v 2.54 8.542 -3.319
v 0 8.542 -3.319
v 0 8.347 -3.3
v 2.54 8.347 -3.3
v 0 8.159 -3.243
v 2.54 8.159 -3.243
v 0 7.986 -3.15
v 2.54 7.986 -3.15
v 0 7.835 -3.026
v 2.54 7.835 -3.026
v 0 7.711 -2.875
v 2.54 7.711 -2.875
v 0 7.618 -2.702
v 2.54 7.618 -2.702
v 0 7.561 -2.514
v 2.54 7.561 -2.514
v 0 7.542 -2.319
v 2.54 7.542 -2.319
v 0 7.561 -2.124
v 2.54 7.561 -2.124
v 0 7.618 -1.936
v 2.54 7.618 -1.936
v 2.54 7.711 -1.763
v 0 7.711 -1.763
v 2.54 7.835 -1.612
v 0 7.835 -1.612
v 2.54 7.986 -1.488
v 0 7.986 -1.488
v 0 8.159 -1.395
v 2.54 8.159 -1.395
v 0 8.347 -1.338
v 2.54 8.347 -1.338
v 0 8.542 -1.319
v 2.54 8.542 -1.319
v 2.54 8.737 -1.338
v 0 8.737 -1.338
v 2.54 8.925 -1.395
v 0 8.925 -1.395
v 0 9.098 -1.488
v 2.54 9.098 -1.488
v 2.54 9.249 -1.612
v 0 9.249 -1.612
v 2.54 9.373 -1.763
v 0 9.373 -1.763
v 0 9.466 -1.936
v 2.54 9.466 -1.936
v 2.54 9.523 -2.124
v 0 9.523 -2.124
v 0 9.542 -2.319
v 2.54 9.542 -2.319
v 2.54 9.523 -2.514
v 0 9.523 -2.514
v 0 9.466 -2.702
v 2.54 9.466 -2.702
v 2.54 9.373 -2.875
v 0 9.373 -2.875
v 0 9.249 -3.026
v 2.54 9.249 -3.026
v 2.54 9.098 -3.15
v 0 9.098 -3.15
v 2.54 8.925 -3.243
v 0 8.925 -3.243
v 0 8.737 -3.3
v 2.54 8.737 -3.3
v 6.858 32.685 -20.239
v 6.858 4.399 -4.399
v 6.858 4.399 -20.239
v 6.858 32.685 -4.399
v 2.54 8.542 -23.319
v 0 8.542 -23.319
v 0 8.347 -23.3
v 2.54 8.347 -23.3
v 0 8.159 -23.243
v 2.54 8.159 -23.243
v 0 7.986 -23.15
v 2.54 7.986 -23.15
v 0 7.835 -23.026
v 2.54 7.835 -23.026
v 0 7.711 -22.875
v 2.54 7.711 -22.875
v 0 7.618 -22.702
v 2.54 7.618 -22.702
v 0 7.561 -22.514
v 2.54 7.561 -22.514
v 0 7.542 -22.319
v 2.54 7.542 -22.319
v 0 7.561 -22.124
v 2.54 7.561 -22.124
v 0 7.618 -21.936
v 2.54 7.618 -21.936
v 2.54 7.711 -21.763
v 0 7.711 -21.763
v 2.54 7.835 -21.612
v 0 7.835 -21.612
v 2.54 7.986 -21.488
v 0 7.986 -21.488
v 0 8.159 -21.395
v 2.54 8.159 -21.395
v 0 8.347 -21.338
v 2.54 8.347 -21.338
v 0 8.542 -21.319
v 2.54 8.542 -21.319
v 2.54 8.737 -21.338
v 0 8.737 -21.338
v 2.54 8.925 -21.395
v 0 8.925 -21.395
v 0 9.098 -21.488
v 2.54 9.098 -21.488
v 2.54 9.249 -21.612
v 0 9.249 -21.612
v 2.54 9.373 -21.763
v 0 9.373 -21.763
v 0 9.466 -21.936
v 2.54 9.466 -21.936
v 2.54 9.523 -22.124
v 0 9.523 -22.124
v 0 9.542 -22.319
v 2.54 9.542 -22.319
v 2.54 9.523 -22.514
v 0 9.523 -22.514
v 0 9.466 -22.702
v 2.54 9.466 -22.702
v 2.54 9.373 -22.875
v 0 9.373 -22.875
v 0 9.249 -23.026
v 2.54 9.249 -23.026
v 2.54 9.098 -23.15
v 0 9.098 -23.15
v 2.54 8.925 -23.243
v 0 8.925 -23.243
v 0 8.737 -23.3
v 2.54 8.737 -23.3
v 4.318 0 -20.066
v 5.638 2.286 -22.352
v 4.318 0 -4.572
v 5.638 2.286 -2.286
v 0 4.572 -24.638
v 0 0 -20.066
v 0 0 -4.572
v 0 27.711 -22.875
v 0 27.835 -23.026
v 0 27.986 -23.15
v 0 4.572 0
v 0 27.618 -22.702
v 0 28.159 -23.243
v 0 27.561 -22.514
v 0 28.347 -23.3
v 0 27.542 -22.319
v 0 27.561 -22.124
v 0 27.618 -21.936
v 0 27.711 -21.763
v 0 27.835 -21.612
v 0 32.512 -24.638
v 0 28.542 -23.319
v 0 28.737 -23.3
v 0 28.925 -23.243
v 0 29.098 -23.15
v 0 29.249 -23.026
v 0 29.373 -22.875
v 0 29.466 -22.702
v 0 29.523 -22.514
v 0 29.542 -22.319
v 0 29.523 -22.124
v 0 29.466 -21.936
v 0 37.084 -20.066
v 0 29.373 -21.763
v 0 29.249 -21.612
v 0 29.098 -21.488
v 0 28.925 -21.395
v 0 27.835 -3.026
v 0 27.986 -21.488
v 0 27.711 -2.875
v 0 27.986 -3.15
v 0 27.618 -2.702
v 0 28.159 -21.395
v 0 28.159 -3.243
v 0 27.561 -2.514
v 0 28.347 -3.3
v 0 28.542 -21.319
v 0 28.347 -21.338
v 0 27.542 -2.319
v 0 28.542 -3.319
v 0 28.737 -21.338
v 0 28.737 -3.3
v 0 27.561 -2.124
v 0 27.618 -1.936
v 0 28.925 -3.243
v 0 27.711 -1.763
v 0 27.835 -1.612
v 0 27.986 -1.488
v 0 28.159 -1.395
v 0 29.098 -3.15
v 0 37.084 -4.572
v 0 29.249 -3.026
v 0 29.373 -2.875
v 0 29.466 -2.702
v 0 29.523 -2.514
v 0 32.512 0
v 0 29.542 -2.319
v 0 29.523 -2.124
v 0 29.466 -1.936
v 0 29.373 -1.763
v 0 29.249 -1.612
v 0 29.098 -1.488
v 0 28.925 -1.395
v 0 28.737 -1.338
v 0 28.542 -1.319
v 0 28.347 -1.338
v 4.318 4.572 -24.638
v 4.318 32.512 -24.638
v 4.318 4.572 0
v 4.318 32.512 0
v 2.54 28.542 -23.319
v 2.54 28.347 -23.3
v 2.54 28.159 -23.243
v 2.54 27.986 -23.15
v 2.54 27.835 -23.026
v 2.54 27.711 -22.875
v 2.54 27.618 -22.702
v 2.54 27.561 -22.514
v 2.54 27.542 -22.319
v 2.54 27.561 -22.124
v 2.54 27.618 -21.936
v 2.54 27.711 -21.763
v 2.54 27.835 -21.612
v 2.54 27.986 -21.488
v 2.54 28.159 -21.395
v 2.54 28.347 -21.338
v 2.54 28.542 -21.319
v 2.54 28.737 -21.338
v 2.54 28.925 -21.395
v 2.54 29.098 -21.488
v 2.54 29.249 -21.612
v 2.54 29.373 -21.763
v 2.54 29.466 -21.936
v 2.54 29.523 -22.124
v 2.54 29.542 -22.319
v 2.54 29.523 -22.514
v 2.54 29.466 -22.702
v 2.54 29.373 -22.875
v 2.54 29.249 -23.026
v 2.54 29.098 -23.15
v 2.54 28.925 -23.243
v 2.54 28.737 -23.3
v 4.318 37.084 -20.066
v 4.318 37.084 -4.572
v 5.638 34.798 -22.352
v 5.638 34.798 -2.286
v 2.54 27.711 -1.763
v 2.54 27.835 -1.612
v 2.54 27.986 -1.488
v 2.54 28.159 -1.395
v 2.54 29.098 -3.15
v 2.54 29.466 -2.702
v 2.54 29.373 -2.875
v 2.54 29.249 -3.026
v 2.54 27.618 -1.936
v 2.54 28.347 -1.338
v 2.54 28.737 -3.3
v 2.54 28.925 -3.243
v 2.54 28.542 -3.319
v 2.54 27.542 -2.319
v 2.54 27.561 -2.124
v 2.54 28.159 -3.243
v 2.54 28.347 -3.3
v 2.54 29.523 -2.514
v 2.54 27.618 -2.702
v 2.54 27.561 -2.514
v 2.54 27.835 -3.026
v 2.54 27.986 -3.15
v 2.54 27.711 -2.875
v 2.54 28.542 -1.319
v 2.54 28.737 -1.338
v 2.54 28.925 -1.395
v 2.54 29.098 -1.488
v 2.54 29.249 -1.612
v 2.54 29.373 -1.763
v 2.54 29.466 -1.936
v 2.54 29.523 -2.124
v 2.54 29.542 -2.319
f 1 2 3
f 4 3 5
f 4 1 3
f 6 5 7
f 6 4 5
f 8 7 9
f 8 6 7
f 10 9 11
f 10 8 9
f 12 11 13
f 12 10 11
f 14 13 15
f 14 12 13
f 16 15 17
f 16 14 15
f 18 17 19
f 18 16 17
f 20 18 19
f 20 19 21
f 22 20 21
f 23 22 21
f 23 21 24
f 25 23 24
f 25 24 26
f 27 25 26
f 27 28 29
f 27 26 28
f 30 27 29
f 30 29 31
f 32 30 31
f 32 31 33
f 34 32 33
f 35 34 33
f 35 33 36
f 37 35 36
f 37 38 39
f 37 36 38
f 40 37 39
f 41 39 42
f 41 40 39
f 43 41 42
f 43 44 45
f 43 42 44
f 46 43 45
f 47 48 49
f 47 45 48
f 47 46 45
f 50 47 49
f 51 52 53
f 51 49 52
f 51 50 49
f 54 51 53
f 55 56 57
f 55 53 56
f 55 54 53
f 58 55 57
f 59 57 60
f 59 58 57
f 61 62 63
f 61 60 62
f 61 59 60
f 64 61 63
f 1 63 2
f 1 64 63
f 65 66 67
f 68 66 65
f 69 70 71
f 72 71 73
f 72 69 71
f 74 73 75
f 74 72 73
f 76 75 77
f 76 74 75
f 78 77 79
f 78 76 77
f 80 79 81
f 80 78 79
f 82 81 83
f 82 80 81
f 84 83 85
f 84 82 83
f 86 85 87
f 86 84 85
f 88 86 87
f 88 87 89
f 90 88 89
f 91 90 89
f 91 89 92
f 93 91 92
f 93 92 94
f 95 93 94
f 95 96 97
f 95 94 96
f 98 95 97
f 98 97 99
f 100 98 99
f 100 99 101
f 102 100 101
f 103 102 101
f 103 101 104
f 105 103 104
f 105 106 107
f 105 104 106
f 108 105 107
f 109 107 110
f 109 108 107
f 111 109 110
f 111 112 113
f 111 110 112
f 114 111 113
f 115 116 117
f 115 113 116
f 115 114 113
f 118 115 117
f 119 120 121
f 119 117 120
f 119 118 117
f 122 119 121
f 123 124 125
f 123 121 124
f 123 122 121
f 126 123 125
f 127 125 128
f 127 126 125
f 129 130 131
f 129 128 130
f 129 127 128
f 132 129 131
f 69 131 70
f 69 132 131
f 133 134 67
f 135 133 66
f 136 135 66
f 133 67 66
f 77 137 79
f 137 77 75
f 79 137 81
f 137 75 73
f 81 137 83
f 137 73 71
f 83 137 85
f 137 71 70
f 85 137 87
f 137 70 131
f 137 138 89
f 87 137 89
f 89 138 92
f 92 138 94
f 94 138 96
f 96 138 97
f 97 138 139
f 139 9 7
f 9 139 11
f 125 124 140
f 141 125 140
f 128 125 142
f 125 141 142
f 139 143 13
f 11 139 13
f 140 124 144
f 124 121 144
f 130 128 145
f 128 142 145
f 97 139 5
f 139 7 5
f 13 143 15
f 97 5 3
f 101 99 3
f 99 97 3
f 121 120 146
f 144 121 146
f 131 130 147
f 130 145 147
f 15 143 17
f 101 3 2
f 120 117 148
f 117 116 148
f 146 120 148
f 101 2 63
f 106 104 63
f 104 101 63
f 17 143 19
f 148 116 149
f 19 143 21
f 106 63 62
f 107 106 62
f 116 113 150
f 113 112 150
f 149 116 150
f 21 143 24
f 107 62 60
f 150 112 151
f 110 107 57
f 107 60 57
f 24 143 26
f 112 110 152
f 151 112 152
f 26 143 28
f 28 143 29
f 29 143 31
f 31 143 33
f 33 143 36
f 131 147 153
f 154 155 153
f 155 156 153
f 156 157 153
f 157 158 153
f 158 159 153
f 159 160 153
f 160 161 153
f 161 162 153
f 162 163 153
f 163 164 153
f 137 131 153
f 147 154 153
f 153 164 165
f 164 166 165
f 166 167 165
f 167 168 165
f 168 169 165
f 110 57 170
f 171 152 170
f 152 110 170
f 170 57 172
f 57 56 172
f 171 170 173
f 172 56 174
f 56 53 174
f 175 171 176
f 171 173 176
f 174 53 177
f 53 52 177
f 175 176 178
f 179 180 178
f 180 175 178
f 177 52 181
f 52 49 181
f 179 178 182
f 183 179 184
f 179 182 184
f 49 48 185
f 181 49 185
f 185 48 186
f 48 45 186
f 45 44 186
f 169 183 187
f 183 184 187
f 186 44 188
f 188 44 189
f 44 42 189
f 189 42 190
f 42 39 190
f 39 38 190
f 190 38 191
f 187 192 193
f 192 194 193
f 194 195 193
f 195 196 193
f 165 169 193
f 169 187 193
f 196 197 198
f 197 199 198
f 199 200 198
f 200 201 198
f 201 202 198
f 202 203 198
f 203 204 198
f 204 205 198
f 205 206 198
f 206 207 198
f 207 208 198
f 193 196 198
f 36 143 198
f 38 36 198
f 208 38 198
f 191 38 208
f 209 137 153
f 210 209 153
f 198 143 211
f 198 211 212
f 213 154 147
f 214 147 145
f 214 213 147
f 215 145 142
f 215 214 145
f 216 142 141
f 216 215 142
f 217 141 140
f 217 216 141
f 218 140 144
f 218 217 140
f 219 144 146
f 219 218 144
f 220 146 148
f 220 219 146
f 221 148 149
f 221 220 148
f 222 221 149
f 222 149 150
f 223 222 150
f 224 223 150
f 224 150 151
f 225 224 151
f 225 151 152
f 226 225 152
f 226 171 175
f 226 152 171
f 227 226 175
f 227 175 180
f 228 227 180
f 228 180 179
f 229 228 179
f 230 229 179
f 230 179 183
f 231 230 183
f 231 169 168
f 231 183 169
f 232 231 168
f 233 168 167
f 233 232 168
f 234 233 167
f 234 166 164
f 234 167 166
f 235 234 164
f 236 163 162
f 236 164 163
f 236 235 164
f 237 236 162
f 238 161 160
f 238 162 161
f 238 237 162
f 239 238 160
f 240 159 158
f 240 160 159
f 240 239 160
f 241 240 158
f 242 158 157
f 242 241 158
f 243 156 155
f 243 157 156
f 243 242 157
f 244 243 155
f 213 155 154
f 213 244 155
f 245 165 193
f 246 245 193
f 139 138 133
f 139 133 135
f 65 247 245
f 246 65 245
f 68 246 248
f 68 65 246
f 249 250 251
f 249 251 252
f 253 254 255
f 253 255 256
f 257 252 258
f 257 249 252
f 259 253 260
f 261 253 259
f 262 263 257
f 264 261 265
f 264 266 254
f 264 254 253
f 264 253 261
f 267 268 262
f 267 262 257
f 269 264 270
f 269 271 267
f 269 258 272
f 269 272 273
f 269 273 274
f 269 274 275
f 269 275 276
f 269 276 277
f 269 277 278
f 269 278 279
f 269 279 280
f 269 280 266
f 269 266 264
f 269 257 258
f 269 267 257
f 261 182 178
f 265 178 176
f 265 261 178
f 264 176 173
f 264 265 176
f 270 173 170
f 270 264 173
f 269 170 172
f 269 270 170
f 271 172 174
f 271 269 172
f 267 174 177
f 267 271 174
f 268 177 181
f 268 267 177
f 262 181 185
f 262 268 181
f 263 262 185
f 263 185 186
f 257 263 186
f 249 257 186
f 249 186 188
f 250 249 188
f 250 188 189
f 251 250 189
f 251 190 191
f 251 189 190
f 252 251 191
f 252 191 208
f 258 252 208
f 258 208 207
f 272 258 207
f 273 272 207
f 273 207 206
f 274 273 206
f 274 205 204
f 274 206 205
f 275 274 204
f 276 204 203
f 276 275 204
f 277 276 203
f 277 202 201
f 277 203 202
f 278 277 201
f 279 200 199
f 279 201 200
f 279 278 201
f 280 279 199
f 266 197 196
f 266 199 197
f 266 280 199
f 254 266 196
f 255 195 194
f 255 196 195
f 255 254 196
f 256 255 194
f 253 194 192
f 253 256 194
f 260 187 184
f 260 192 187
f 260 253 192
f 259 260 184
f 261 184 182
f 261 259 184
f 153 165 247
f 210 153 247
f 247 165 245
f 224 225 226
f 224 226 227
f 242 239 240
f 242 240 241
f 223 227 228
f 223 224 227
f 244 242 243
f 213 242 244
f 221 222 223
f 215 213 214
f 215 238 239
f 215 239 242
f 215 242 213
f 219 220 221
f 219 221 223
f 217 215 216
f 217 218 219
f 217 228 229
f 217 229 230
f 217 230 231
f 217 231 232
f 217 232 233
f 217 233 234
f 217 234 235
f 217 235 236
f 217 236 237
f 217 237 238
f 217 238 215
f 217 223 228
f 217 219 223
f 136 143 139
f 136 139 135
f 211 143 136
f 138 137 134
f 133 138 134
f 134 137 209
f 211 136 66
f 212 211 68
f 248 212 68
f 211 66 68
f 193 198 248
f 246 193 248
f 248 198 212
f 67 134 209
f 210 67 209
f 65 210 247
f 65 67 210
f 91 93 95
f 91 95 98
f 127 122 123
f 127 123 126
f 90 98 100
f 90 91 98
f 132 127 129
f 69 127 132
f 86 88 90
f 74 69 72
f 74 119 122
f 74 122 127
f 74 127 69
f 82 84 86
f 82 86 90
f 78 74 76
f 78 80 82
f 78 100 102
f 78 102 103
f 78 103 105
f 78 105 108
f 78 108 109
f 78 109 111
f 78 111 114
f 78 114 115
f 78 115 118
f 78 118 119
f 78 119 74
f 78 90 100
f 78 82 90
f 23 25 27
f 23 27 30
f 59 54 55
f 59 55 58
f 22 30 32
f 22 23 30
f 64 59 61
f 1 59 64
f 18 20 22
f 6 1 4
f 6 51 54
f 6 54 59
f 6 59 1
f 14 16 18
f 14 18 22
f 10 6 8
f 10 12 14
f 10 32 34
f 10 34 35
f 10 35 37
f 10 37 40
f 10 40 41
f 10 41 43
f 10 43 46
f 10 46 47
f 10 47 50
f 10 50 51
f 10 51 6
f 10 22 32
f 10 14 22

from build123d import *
from OCP.BRepFilletAPI import BRepFilletAPI_MakeChamfer

# Parameters (mm, degrees)
SKETCH1_W               = 37.084
SKETCH1_H               = 24.638
BOSS_EXTRUDE1_DEPTH     = 6.858
CHAMFER2_SIZE           = 4.572
CHAMFER3_SIZE           = 2.54
CHAMFER3_SIZE2          = 4.399409051
CHAMFER4_SIZE           = 2.54
CHAMFER4_SIZE2          = 4.399409051
CUT_EXTRUDE1_DEPTH      = 46.04759998
CUT_EXTRUDE1_DEPTH_BACK = 2.54
SKETCH3_R               = 1


with BuildPart() as part:
    # Sketch1 → Boss-Extrude1 (new body)
    with BuildSketch(Plane.YZ):
        with Locations((18.542, -12.319)):
            Rectangle(SKETCH1_W, SKETCH1_H)
    extrude(amount=BOSS_EXTRUDE1_DEPTH)

    # Chamfer2
    chamfer2_edges = [part.edges().sort_by_distance(p)[0] for p in [
        (3.429, 0, 0),
        (3.429, 37.084, 0),
        (3.429, 37.084, -24.638),
        (3.429, 0, -24.638),
    ]]
    chamfer(chamfer2_edges, length=CHAMFER2_SIZE)

    # Chamfer3: one chamfer whose edges measure the first distance from different faces: ONE call of the kernel's chamfer builder (chamfer() names one face for all edges)
    chamfer3_edges_1 = [part.edges().sort_by_distance(p)[0] for p in [
        (6.858, 18.542, 0),
    ]]
    chamfer3_side_1 = [part.faces().sort_by_distance(p)[0] for p in [
        (3.429, 18.542, 0),
    ]]
    chamfer3_edges_2 = [part.edges().sort_by_distance(p)[0] for p in [
        (6.858, 18.542, -24.638),
    ]]
    chamfer3_side_2 = [part.faces().sort_by_distance(p)[0] for p in [
        (3.429, 18.542, -24.638),
    ]]
    chamfer3 = BRepFilletAPI_MakeChamfer(part.part.solid().wrapped)
    for e in chamfer3_edges_1:
        chamfer3.Add(CHAMFER3_SIZE, CHAMFER3_SIZE2, e.wrapped, chamfer3_side_1[0].wrapped)  # the first distance lies on this face
    for e in chamfer3_edges_2:
        chamfer3.Add(CHAMFER3_SIZE, CHAMFER3_SIZE2, e.wrapped, chamfer3_side_2[0].wrapped)  # the first distance lies on this face
    add(Compound.cast(chamfer3.Shape()), mode=Mode.REPLACE)

    # Chamfer4: one chamfer whose edges measure the first distance from different faces: ONE call of the kernel's chamfer builder (chamfer() names one face for all edges)
    chamfer4_edges_1 = [part.edges().sort_by_distance(p)[0] for p in [
        (6.858, 0, -12.319),
    ]]
    chamfer4_side_1 = [part.faces().sort_by_distance(p)[0] for p in [
        (3.429, 0, -12.319),
    ]]
    chamfer4_edges_2 = [part.edges().sort_by_distance(p)[0] for p in [
        (6.858, 37.084, -12.319),
    ]]
    chamfer4_side_2 = [part.faces().sort_by_distance(p)[0] for p in [
        (3.429, 37.084, -12.319),
    ]]
    chamfer4 = BRepFilletAPI_MakeChamfer(part.part.solid().wrapped)
    for e in chamfer4_edges_1:
        chamfer4.Add(CHAMFER4_SIZE, CHAMFER4_SIZE2, e.wrapped, chamfer4_side_1[0].wrapped)  # the first distance lies on this face
    for e in chamfer4_edges_2:
        chamfer4.Add(CHAMFER4_SIZE, CHAMFER4_SIZE2, e.wrapped, chamfer4_side_2[0].wrapped)  # the first distance lies on this face
    add(Compound.cast(chamfer4.Shape()), mode=Mode.REPLACE)

    # Sketch3 → Cut-Extrude1 (cut, two sides: drawn at the far end of the back side and taken through both)
    with BuildSketch(Plane(origin=(0, 0, 0), x_dir=(0, -1, 0), z_dir=(-1, 0, 0)).offset(-CUT_EXTRUDE1_DEPTH_BACK)):
        with Locations(Location((-8.542, -2.319, 0), (0, 0, 270))):
            Circle(SKETCH3_R)
        with Locations(Location((-8.542, -22.319, 0), (0, 0, 270))):
            Circle(SKETCH3_R)
        with Locations(Location((-28.542, -22.319, 0), (0, 0, 270))):
            Circle(SKETCH3_R)
        with Locations(Location((-28.542, -2.319, 0), (0, 0, 270))):
            Circle(SKETCH3_R)
    extrude(amount=CUT_EXTRUDE1_DEPTH + CUT_EXTRUDE1_DEPTH_BACK, mode=Mode.SUBTRACT)


solid = part.part
